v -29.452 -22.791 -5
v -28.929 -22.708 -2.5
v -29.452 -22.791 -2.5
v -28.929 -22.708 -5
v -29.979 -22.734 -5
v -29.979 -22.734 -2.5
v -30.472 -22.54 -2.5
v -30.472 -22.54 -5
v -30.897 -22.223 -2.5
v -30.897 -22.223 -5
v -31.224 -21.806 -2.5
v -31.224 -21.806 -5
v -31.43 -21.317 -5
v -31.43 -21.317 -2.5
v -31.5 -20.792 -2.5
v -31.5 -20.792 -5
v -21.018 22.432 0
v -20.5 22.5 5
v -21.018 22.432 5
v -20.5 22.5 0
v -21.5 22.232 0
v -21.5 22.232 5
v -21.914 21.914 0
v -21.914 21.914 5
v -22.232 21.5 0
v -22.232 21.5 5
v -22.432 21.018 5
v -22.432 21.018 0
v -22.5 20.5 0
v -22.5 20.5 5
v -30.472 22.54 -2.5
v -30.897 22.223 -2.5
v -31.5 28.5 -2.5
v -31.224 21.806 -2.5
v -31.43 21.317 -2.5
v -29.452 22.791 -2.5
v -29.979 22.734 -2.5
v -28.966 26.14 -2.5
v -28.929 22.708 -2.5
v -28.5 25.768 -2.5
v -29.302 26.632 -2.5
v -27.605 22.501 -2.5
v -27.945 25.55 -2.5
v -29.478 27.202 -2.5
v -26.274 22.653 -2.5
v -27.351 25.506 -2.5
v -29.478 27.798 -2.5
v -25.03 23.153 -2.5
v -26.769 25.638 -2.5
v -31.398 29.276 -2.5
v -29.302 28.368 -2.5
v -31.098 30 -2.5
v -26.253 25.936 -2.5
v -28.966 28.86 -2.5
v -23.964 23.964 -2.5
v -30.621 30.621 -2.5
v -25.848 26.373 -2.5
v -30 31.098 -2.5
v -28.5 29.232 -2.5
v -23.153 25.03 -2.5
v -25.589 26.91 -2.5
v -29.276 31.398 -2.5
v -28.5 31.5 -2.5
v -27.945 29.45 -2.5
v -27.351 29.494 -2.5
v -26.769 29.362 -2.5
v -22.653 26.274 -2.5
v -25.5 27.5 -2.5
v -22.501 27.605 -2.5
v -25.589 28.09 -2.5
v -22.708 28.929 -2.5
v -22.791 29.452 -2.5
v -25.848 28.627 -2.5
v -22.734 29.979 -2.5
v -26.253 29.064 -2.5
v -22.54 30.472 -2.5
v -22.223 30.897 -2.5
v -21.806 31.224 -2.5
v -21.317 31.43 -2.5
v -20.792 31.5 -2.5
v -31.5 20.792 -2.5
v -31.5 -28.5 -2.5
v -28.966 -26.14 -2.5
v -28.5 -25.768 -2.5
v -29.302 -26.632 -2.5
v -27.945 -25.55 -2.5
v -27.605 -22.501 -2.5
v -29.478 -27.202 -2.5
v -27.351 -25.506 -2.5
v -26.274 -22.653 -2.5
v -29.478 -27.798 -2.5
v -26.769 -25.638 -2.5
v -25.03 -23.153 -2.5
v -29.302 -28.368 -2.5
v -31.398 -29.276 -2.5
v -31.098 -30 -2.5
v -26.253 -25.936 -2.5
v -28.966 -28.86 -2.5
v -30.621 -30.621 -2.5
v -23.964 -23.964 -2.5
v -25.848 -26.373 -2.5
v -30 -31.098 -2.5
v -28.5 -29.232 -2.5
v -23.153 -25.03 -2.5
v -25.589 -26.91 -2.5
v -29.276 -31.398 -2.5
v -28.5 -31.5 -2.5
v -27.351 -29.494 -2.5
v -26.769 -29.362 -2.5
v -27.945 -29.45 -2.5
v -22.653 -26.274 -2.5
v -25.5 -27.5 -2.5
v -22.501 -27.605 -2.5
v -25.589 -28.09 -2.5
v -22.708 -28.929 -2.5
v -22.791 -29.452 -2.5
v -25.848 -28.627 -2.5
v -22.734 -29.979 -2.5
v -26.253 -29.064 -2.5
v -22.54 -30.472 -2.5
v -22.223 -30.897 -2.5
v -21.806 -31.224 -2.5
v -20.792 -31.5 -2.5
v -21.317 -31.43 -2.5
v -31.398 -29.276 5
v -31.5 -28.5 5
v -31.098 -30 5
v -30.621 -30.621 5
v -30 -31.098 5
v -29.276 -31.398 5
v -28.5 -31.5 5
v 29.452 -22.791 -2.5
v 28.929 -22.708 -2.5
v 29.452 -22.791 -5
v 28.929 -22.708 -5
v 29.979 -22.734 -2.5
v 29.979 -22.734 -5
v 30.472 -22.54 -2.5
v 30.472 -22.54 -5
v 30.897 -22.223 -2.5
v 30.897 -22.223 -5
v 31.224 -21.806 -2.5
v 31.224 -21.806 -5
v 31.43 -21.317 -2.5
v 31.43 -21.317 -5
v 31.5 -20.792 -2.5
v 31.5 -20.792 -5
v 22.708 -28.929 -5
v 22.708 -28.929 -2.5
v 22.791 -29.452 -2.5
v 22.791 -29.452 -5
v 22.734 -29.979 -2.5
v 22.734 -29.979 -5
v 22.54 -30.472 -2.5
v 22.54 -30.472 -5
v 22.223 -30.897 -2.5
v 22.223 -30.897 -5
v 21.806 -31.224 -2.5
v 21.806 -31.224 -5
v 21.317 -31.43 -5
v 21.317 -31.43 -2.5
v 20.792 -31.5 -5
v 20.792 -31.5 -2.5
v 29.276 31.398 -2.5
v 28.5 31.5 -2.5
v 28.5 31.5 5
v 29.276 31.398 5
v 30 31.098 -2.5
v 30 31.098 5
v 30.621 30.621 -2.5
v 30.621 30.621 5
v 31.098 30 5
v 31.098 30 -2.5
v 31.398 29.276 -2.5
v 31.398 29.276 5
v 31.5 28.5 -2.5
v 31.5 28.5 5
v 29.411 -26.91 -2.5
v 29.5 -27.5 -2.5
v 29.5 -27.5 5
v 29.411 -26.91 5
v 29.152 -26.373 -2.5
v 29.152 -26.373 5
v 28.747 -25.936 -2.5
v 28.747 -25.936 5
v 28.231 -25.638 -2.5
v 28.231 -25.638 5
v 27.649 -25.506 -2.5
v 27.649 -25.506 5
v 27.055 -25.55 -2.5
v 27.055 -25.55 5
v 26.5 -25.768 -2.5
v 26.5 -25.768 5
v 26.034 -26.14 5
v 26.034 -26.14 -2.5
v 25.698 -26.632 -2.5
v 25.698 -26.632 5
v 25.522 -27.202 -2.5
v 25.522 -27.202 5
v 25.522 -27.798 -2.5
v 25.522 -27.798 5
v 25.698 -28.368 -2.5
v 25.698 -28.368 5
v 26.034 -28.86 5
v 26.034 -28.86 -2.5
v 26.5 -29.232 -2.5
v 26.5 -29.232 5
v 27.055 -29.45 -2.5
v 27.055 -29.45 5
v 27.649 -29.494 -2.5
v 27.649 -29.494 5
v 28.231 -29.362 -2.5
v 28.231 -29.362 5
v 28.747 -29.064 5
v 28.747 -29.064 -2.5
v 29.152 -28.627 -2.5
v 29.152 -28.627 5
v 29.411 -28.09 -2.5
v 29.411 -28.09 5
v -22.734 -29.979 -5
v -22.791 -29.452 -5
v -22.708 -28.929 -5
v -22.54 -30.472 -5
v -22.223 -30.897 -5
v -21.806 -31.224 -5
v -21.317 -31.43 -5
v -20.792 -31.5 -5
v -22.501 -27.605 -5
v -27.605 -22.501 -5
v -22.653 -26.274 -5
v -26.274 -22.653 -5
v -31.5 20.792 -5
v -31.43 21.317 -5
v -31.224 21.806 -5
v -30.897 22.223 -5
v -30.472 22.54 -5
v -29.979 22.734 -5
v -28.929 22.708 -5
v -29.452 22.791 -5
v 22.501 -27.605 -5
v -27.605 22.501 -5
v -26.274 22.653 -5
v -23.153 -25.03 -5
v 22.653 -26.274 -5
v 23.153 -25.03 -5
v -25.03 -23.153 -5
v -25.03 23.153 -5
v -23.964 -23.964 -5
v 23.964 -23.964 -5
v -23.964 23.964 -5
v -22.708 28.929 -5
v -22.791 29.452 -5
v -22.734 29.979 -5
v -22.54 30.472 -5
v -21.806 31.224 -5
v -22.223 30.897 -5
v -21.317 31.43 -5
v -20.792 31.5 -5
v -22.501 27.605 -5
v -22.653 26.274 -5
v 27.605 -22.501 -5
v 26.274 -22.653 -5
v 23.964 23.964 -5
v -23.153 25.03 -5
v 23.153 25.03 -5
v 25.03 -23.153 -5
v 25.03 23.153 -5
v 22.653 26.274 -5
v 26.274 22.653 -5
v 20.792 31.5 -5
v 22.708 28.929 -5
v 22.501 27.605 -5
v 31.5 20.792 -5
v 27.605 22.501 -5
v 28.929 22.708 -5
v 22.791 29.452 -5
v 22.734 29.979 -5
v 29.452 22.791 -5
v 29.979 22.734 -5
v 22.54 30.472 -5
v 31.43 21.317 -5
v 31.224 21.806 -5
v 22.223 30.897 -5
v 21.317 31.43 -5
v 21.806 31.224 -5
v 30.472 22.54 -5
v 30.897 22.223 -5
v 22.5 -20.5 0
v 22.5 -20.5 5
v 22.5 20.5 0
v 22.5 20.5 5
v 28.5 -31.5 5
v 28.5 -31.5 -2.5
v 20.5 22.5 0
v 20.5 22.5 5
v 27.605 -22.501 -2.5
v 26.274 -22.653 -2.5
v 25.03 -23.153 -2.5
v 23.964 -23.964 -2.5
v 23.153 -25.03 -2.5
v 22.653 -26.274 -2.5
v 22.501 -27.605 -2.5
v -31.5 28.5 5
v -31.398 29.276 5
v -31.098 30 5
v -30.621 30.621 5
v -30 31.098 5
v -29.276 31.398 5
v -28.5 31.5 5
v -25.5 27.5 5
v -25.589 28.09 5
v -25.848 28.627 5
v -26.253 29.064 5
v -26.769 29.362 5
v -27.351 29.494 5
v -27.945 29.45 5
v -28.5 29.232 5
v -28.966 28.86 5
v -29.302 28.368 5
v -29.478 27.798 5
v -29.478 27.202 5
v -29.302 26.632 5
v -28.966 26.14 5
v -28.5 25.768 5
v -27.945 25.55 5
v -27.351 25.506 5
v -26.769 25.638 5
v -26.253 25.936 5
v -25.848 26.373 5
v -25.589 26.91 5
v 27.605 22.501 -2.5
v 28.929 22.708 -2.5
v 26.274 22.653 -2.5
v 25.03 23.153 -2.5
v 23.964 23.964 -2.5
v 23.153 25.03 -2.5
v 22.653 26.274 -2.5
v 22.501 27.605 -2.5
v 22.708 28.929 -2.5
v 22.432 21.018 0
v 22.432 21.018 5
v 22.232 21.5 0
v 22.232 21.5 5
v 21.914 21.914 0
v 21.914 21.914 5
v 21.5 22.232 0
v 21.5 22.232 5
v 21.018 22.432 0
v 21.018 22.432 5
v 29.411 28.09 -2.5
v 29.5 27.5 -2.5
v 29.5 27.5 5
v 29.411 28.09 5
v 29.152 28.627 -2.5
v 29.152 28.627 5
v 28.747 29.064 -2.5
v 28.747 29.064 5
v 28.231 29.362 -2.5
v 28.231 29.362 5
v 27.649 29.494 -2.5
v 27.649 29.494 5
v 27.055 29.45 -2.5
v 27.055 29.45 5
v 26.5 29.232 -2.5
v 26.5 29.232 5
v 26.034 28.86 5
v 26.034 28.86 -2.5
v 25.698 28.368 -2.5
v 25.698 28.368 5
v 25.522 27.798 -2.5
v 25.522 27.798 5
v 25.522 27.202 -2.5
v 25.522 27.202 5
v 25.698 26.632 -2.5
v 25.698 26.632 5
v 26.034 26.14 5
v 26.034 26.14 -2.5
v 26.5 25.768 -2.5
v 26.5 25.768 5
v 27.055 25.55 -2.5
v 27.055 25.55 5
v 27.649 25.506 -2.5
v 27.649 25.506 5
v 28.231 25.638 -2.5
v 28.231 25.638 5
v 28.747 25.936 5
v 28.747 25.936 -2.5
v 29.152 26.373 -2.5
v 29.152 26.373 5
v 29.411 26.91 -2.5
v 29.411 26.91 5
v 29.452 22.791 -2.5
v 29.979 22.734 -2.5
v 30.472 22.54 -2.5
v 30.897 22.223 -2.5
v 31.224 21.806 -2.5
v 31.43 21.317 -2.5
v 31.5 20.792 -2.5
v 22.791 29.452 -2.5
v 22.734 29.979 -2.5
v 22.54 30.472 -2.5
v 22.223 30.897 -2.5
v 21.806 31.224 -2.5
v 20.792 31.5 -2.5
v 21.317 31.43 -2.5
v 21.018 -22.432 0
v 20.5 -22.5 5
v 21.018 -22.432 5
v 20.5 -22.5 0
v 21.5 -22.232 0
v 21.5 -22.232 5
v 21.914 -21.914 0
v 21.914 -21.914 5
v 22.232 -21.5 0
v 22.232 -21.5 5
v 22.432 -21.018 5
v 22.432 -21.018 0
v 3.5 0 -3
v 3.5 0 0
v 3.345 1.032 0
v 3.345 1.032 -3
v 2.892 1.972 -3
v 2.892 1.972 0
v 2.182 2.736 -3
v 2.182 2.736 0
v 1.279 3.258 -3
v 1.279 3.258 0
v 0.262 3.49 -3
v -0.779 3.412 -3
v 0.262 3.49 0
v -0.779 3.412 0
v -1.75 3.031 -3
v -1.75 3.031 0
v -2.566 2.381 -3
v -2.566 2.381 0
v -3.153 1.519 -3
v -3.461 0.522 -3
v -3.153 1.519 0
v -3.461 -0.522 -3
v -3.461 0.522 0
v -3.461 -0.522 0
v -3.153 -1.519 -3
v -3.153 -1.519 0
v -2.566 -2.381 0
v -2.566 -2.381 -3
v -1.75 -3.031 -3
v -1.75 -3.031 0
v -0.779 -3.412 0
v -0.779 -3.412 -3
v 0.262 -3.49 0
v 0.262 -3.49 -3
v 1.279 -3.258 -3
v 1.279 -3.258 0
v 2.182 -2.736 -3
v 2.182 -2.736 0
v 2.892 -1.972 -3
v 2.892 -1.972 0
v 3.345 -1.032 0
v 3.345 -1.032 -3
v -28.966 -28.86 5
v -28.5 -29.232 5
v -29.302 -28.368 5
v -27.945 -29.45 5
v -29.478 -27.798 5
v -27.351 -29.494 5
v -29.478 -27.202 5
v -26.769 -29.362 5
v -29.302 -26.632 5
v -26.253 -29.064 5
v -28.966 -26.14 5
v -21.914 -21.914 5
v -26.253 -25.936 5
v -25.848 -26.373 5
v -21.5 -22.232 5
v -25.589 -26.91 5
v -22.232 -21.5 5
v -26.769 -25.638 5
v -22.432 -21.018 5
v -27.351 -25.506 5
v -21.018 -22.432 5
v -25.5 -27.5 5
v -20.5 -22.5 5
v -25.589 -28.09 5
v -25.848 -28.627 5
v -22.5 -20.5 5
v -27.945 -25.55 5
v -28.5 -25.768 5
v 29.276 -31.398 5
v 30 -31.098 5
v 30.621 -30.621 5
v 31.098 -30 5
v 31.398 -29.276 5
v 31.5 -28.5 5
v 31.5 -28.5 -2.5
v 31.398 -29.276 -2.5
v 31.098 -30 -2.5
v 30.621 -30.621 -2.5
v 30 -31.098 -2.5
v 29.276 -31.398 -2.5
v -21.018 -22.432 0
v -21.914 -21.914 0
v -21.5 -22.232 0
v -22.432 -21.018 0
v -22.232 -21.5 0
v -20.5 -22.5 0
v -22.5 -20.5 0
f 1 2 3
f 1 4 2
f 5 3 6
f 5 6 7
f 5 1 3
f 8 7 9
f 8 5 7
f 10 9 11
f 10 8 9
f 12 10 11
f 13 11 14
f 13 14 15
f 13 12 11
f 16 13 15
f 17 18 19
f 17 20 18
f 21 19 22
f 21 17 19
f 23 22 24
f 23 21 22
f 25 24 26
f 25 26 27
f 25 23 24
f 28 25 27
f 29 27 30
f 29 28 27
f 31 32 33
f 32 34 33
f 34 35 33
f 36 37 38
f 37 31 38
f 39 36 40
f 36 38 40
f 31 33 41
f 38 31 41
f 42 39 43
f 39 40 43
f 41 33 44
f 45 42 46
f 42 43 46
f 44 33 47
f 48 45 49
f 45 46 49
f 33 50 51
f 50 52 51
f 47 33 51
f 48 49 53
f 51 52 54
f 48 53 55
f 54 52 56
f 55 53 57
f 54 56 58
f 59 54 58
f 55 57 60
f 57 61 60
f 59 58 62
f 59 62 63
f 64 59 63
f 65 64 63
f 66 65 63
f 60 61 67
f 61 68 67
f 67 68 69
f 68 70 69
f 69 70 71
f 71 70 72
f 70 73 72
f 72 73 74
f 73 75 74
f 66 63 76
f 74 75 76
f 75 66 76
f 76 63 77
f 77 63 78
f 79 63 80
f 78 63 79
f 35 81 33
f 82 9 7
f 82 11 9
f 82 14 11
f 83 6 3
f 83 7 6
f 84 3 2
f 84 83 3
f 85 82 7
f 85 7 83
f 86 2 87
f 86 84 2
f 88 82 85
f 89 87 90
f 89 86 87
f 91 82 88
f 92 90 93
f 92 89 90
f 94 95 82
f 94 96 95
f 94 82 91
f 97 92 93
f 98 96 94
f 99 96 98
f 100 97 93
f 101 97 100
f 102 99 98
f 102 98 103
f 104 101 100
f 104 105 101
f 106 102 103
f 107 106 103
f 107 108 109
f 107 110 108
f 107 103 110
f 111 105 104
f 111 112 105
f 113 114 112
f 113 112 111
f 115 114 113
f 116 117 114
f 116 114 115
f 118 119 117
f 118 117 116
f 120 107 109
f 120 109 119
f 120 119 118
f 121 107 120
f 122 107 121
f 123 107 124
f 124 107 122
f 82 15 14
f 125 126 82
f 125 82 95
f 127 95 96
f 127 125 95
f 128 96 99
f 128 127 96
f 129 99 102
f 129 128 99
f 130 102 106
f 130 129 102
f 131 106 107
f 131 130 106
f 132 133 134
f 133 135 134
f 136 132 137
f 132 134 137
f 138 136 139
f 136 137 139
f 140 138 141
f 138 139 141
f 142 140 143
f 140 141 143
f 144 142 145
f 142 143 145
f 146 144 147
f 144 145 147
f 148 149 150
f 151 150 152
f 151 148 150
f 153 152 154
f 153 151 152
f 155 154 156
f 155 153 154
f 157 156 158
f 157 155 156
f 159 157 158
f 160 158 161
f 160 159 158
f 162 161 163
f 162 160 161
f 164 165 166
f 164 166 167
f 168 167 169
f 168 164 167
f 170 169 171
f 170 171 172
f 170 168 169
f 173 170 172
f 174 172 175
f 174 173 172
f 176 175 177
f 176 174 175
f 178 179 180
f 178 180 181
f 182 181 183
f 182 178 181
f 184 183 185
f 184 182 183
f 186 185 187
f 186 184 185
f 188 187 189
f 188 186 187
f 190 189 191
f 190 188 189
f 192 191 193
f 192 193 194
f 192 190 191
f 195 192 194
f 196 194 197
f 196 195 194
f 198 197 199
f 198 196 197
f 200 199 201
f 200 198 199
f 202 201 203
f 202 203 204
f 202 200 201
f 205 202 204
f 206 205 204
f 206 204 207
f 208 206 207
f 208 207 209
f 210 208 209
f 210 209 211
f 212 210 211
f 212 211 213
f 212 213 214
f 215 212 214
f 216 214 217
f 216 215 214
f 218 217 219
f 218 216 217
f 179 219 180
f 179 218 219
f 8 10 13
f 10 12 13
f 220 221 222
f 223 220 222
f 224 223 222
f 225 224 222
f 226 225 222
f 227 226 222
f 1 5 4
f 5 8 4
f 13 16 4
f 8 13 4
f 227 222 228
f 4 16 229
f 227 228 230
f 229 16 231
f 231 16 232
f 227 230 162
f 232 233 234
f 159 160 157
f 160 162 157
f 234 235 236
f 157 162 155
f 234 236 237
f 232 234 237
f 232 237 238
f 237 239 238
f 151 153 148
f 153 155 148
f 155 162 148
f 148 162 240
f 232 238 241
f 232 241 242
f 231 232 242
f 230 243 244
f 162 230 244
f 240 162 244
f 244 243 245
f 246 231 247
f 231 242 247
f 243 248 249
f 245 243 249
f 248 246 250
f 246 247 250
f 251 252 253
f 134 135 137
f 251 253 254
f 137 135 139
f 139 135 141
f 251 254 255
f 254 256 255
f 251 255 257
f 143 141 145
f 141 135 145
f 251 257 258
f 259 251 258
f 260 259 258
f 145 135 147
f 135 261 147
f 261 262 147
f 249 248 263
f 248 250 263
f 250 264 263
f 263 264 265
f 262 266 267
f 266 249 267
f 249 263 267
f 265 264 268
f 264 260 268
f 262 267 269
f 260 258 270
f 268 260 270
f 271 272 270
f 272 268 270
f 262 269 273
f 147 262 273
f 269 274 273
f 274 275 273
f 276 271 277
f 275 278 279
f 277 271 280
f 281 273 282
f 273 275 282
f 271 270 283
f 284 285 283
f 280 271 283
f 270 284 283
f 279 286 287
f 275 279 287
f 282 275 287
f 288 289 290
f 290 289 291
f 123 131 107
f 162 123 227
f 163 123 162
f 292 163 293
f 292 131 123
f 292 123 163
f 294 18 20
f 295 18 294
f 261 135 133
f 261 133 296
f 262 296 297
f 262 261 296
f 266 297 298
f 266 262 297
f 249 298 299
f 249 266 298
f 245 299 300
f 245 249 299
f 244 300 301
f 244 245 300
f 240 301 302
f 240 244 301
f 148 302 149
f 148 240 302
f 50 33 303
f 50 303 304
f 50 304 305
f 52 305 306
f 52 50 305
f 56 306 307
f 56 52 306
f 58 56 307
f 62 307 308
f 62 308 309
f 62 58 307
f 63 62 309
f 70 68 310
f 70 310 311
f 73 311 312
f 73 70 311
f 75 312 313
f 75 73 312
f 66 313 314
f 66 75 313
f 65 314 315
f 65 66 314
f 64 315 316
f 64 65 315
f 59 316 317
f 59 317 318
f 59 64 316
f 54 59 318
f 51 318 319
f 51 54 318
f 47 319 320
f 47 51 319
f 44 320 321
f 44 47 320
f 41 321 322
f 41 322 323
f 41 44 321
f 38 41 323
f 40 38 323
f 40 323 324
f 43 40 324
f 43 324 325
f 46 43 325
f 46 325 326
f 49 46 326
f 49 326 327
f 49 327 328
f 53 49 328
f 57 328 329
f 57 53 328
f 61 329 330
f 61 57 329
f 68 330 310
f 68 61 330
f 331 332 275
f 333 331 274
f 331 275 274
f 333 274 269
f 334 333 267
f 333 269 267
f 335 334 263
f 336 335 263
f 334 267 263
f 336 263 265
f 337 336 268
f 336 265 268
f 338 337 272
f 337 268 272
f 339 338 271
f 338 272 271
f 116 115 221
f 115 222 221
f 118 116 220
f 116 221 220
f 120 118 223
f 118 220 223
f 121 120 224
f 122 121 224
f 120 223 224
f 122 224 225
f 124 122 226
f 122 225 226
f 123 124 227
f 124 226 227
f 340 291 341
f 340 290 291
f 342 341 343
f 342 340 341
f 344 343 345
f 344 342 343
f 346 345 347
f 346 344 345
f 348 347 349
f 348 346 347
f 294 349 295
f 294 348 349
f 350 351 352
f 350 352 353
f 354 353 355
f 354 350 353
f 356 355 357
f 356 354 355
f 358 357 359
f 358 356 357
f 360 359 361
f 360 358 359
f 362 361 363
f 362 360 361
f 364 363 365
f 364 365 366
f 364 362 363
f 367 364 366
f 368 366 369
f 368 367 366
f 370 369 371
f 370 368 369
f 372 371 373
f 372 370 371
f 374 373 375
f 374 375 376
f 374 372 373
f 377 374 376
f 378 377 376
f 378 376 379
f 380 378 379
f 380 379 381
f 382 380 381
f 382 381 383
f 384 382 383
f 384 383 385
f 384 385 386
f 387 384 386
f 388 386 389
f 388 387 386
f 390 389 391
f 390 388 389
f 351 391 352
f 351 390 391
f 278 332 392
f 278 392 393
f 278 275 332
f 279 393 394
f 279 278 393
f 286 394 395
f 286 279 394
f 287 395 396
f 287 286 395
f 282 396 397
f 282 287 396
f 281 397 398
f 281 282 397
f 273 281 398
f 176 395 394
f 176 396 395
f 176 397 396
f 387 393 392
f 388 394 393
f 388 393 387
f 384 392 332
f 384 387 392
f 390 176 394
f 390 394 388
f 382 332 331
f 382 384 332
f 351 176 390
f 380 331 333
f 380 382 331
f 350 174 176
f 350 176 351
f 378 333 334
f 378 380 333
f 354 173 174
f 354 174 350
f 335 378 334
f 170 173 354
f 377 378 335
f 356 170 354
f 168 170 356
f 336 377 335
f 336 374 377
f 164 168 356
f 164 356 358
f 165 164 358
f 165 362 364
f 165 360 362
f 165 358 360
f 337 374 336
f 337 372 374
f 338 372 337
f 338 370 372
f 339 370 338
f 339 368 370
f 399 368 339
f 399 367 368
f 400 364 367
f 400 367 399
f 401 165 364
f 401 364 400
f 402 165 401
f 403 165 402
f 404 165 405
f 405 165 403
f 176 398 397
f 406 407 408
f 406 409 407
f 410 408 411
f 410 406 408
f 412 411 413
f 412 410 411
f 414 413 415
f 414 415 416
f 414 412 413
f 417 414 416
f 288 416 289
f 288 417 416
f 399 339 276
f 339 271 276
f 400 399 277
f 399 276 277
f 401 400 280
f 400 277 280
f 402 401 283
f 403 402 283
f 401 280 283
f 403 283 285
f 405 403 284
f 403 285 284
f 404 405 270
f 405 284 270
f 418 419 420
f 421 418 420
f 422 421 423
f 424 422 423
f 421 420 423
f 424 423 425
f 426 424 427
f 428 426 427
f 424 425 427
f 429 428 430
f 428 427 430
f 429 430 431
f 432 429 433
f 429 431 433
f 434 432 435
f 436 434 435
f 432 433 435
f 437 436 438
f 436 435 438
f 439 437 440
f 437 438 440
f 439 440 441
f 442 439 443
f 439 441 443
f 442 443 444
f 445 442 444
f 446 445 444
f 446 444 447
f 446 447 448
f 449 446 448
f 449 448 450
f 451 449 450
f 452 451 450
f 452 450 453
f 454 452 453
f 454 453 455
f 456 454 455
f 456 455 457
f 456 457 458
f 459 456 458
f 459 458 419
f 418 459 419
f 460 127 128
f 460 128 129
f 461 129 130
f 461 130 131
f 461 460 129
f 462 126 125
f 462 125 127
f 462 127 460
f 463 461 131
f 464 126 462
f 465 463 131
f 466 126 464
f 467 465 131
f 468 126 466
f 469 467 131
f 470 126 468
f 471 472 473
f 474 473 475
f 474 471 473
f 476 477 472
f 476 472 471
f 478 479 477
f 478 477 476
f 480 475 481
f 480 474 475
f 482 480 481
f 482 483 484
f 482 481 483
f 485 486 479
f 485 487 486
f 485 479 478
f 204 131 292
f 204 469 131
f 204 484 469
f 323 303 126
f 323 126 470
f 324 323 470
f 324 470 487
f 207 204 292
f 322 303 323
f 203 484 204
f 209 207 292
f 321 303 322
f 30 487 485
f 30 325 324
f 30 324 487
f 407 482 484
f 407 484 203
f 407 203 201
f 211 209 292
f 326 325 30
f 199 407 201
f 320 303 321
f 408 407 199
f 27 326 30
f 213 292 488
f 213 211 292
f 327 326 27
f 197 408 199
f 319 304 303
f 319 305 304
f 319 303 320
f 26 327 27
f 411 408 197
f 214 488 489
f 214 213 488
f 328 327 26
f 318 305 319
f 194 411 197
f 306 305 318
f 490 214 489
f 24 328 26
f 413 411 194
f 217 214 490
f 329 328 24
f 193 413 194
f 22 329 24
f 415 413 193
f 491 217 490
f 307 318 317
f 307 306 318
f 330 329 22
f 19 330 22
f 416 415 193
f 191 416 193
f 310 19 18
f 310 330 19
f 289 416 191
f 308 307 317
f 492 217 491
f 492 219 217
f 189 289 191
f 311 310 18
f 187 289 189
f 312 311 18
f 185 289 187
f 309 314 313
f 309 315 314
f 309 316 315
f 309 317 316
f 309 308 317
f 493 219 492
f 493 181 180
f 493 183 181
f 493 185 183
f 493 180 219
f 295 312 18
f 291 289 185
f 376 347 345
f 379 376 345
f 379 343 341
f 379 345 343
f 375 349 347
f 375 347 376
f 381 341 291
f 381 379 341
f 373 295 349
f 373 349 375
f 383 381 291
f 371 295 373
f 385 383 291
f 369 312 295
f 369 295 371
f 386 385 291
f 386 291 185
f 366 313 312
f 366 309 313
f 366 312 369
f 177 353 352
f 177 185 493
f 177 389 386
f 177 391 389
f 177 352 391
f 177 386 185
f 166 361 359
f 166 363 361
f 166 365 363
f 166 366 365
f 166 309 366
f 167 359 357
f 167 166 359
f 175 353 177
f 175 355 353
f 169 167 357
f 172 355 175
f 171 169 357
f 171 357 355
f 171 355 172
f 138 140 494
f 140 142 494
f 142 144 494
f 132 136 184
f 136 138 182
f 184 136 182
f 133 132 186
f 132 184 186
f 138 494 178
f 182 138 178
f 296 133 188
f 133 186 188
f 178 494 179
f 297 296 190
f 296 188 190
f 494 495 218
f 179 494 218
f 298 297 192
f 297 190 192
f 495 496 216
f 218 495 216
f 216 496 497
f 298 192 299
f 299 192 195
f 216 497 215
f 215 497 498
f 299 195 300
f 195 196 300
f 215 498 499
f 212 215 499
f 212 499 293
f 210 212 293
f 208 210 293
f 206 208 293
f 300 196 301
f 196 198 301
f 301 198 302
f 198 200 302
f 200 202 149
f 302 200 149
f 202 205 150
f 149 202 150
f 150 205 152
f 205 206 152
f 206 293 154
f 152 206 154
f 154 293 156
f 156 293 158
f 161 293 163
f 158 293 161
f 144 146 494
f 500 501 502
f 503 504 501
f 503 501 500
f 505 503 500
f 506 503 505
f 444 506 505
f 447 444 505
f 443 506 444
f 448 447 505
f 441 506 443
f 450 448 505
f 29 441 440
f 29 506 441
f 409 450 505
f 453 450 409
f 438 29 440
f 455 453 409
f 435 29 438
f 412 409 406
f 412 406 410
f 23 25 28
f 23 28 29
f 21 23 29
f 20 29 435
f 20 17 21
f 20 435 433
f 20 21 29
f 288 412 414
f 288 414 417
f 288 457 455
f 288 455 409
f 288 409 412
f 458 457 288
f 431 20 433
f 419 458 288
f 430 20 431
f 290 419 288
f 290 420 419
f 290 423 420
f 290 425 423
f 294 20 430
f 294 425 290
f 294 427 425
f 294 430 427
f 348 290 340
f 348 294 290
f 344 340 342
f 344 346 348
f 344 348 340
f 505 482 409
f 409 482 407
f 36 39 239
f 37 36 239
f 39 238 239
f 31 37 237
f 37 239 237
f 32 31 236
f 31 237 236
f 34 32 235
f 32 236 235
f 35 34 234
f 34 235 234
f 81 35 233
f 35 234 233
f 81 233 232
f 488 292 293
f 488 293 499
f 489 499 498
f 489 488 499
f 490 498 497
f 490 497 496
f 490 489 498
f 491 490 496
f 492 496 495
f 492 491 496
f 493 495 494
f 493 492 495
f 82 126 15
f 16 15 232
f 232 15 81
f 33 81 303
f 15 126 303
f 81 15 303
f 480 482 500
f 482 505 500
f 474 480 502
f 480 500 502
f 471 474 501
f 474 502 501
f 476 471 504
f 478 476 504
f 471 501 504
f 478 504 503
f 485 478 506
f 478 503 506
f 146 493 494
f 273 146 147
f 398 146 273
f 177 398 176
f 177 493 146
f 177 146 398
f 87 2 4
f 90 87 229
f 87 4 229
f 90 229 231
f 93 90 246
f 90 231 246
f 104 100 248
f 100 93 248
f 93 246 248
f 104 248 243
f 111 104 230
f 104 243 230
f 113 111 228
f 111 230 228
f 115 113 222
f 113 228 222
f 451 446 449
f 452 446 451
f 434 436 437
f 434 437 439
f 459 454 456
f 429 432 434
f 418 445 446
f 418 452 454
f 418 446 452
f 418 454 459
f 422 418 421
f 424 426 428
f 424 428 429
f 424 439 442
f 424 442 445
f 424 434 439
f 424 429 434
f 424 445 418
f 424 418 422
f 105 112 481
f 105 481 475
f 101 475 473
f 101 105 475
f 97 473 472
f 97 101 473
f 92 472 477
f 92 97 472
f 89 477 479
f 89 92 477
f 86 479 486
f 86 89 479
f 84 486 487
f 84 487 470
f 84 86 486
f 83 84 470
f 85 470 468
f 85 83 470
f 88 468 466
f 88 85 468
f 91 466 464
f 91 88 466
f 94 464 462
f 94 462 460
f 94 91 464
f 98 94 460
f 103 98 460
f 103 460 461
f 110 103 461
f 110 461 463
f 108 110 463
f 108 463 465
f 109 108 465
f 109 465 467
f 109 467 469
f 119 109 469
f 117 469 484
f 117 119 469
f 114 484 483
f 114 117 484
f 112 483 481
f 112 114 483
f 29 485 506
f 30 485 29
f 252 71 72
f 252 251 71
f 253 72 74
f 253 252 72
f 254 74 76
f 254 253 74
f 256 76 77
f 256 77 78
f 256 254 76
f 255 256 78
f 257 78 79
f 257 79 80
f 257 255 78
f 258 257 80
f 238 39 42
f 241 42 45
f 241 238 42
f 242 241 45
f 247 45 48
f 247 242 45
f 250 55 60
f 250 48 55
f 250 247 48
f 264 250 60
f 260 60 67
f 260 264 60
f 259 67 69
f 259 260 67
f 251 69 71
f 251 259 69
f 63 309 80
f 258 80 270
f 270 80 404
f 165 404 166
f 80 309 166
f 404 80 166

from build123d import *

# Parameters (mm, degrees)
SKETCH1_W                                  = 63
SKETCH1_H                                  = 63
SKETCH1_R                                  = 2
BOSS_EXTRUDE1_DEPTH                        = 5
SKETCH3_W                                  = 45
SKETCH3_H                                  = 45
CUT_EXTRUDE1_DEPTH                         = 5
FILLET1_R                                  = 3
SKETCH4_R                                  = 3.5
CUT_EXTRUDE2_DEPTH                         = 8
FILLET2_R                                  = 2
SKETCH5_R                                  = 5
CUT_EXTRUDE3_DEPTH                         = 2.5
MIRROR1_AT_THE_SECOND_PLANE_COPY_1_SKETC_R = 5
MIRROR1_AT_THE_SECOND_PLANE_COPY_1_DEPTH   = 2.5
FILLET3_R                                  = 2


with BuildPart() as part:
    # Sketch1 → Boss-Extrude1 (new, symmetric)
    with BuildSketch(Plane.XY):
        Rectangle(SKETCH1_W, SKETCH1_H)
        with Locations((-27.5, 27.5)):
            Circle(SKETCH1_R, mode=Mode.SUBTRACT)
        with Locations((27.5, 27.5)):
            Circle(SKETCH1_R, mode=Mode.SUBTRACT)
        with Locations((27.5, -27.5)):
            Circle(SKETCH1_R, mode=Mode.SUBTRACT)
        with Locations((-27.5, -27.5)):
            Circle(SKETCH1_R, mode=Mode.SUBTRACT)
    extrude(amount=BOSS_EXTRUDE1_DEPTH, both=True)

    # Sketch3 → Cut-Extrude1 (cut)
    with BuildSketch(Plane.XY.offset(5)):
        Rectangle(SKETCH3_W, SKETCH3_H)
    extrude(amount=-CUT_EXTRUDE1_DEPTH, mode=Mode.SUBTRACT)

    # Fillet1
    fillet1_edges = [part.edges().sort_by_distance(p)[0] for p in [
        (-31.5, 31.5, 0),
        (31.5, 31.5, 0),
        (31.5, -31.5, 0),
        (-31.5, -31.5, 0),
    ]]
    fillet(fillet1_edges, radius=FILLET1_R)

    # Sketch4 → Cut-Extrude2 (cut)
    with BuildSketch(Plane.XY.offset(5)):
        Circle(SKETCH4_R)
    extrude(amount=-CUT_EXTRUDE2_DEPTH, mode=Mode.SUBTRACT)

    # Fillet2
    fillet2_edges = [part.edges().sort_by_distance(p)[0] for p in [
        (-22.5, -22.5, 2.5),
        (-22.5, 22.5, 2.5),
        (22.5, 22.5, 2.5),
        (22.5, -22.5, 2.5),
    ]]
    fillet(fillet2_edges, radius=FILLET2_R)

    # Sketch5 → Cut-Extrude3 (cut)
    with BuildSketch(Plane(origin=(0, 0, -5), x_dir=(-1, 0, 0), z_dir=(0, 0, -1))):
        with Locations((-27.5, 27.5)):
            Circle(SKETCH5_R)
    cut_extrude3 = extrude(amount=-CUT_EXTRUDE3_DEPTH, mode=Mode.SUBTRACT)

    # Mirror1: Cut-Extrude3 across plane
    add(cut_extrude3.mirror(Plane(origin=(0, 0, 0), x_dir=(0, 0, 1), z_dir=(1, 0, 0))), mode=Mode.SUBTRACT)

    # Mirror1 at the second plane: Cut-Extrude3 across plane
    add(cut_extrude3.mirror(Plane.ZX), mode=Mode.SUBTRACT)

    # Mirror1 at the second plane copy 1 sketc → Mirror1 at the second plane copy 1 (cut)
    with BuildSketch(Plane(origin=(0, 0, -5), x_dir=(1, 0, 0), z_dir=(0, 0, -1))):
        with Locations((-27.5, 27.5)):
            Circle(MIRROR1_AT_THE_SECOND_PLANE_COPY_1_SKETC_R)
    extrude(amount=-MIRROR1_AT_THE_SECOND_PLANE_COPY_1_DEPTH, mode=Mode.SUBTRACT)

    # Fillet3
    fillet3_edges = [part.edges().sort_by_distance(p)[0] for p in [
        (24.5, 31.5, -3.75),
        (31.5, 24.5, -3.75),
        (31.5, -24.5, -3.75),
        (24.5, -31.5, -3.75),
        (-24.5, 31.5, -3.75),
        (-31.5, 24.5, -3.75),
        (-31.5, -24.5, -3.75),
        (-24.5, -31.5, -3.75),
    ]]
    fillet(fillet3_edges, radius=FILLET3_R)


solid = part.part
